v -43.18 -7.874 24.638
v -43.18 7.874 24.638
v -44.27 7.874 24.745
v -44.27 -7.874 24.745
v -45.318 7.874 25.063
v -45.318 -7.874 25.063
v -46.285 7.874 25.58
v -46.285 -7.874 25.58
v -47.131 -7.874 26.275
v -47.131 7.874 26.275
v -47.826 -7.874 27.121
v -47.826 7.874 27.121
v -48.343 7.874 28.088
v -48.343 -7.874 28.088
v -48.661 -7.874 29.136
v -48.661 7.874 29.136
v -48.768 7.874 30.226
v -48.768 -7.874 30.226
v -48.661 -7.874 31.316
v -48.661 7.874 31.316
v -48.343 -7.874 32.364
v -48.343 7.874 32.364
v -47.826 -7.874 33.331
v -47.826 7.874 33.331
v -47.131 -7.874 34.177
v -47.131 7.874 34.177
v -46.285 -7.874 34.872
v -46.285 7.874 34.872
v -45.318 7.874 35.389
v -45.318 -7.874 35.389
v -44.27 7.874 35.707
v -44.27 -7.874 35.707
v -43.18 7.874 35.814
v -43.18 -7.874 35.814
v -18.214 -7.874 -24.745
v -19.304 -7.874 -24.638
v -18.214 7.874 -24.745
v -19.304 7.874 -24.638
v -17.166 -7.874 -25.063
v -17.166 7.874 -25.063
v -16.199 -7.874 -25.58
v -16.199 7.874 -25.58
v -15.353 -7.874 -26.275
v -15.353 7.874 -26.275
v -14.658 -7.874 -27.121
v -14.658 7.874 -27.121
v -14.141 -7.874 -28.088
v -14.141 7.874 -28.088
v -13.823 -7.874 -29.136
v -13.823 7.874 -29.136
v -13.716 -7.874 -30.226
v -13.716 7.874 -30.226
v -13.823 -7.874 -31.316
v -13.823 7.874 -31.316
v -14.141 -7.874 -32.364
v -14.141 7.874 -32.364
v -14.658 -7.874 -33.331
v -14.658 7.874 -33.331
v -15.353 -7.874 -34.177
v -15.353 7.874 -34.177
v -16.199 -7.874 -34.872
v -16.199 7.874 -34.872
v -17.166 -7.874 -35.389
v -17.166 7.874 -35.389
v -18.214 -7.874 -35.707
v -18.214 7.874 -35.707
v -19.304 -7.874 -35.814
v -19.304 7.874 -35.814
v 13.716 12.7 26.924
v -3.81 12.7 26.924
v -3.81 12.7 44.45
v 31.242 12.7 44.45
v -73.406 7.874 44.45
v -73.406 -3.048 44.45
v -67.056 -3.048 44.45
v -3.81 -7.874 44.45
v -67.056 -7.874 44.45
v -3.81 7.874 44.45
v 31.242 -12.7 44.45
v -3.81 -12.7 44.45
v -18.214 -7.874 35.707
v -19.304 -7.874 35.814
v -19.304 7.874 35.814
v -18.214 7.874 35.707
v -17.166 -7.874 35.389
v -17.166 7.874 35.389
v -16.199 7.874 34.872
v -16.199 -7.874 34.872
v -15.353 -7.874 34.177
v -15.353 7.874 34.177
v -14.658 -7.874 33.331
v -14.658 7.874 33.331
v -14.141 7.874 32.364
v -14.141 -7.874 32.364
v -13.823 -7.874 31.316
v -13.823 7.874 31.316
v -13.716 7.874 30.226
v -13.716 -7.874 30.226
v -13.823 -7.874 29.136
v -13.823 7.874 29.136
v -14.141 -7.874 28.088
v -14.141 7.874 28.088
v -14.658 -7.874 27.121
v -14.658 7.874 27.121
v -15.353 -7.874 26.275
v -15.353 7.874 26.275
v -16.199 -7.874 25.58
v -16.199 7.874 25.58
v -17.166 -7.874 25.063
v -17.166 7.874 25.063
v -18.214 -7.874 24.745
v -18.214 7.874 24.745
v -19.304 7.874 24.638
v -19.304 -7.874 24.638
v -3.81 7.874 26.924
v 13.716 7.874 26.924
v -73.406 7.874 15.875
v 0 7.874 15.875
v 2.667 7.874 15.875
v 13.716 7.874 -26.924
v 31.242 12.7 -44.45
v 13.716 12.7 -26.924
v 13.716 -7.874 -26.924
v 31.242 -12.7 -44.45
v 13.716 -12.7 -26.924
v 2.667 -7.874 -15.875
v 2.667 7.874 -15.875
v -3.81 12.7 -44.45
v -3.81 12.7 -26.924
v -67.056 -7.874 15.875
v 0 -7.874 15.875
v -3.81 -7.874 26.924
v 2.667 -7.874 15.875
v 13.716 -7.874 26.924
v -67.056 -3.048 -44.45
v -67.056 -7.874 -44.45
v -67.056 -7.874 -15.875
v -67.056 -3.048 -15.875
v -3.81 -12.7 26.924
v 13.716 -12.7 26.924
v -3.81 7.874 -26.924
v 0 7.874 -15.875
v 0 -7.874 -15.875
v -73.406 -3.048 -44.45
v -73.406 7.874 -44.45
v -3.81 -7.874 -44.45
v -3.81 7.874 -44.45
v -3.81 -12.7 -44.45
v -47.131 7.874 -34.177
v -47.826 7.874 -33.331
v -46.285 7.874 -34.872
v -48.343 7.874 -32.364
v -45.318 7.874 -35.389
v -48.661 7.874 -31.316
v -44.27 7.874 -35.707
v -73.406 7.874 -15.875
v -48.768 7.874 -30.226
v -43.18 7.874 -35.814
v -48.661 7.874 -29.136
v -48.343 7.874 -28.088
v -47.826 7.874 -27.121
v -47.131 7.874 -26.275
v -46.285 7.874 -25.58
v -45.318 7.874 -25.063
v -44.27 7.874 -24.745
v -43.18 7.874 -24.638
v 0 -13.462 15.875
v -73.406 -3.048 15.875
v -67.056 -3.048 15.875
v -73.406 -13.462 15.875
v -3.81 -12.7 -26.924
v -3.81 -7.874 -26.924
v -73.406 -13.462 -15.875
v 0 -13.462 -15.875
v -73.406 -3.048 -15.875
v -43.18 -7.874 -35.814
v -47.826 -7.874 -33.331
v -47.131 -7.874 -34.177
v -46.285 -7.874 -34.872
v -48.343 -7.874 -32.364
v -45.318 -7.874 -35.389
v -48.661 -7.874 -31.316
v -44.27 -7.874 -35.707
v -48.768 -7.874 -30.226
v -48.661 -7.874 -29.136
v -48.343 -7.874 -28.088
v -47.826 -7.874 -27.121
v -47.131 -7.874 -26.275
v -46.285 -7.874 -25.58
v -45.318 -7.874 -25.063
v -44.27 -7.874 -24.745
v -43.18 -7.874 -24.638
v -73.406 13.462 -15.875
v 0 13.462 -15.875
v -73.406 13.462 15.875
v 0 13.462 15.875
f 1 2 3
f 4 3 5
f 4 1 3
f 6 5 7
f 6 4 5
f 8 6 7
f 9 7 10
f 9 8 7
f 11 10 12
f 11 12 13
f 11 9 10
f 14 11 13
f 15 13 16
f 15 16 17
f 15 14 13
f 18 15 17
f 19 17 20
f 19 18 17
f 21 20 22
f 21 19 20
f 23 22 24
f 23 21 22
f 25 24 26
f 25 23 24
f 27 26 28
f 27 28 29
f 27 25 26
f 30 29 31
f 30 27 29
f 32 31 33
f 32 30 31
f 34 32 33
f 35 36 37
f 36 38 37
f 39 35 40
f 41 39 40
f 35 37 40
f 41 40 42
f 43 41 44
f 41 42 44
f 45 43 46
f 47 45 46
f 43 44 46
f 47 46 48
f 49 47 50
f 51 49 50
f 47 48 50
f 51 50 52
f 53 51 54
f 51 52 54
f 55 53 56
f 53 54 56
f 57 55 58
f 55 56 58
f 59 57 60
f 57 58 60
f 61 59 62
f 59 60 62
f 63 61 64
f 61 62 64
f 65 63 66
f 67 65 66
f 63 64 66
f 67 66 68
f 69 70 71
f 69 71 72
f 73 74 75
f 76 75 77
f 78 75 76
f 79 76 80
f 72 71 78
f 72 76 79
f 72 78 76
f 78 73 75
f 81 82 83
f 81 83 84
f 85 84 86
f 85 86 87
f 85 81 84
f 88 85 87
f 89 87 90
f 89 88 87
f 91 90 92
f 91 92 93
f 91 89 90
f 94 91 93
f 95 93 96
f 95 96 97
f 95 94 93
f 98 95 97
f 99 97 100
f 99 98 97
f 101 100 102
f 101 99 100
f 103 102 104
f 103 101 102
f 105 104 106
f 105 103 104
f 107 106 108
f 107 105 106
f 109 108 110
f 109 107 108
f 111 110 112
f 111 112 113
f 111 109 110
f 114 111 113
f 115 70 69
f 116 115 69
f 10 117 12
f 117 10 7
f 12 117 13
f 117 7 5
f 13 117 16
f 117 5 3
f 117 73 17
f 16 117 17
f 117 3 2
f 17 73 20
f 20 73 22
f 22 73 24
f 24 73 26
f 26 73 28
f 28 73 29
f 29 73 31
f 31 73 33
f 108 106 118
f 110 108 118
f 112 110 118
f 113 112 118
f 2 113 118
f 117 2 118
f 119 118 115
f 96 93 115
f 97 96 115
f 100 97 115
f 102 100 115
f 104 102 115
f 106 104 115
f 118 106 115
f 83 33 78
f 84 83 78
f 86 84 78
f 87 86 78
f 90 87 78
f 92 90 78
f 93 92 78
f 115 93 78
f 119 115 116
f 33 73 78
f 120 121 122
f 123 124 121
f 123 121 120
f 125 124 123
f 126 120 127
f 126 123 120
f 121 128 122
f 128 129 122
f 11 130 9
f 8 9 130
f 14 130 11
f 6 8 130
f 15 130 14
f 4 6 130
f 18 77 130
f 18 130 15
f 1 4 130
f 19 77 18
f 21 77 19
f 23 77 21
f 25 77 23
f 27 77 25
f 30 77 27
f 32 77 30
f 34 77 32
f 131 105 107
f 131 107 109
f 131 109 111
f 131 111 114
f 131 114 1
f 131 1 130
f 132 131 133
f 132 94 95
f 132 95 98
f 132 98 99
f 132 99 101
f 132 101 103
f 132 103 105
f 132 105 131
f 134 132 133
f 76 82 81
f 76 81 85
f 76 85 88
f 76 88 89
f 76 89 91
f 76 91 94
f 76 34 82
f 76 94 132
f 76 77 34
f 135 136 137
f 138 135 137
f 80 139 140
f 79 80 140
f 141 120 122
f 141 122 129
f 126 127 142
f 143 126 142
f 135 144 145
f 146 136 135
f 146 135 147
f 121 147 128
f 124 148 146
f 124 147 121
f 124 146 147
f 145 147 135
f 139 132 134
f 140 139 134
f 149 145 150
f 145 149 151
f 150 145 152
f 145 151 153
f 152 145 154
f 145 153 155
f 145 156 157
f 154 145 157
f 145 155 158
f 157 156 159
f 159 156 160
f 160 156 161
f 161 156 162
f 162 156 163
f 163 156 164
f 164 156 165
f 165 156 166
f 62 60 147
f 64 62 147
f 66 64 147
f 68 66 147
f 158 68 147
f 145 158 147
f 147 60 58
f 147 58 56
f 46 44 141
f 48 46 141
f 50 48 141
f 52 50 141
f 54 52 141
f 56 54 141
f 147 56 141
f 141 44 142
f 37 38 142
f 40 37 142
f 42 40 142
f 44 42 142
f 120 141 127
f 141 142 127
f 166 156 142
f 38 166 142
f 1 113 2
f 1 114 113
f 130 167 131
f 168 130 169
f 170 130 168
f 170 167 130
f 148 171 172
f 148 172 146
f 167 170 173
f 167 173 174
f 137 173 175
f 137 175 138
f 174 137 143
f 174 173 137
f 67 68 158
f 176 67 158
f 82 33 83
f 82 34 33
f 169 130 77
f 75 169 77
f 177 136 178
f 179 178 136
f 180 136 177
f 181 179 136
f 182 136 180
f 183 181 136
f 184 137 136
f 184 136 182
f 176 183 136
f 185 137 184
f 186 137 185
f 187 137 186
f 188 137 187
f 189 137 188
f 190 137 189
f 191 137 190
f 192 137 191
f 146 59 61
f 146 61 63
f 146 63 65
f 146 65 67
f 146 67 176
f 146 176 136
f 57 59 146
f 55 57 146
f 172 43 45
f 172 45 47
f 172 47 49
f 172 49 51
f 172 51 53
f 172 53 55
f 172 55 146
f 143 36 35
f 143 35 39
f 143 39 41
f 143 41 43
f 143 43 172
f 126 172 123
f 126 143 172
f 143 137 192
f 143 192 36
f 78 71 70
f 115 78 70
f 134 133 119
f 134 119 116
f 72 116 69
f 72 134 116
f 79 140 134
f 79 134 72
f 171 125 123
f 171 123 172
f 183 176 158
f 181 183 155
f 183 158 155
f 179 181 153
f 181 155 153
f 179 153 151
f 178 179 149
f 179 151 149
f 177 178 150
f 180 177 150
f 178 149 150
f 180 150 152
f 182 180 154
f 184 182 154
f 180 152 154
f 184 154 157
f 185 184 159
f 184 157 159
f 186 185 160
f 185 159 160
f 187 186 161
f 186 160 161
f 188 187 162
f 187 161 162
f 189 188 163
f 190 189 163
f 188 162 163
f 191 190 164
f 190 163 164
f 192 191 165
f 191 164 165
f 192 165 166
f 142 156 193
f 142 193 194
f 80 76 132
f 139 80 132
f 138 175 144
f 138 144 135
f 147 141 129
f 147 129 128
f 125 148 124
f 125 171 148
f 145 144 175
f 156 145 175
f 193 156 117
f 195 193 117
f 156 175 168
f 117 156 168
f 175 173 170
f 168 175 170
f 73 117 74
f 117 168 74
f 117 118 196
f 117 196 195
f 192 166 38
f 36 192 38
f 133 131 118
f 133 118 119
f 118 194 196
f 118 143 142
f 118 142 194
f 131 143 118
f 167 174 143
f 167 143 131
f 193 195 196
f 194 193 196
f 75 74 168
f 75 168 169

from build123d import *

# Parameters (mm, degrees)
F1_DEPTH = 13.462
F2_DEPTH = 7.874
F3_DEPTH = 12.7
F0_W     = 6.35
F0_H     = 28.575
F4_DEPTH = 7.874
F5_W     = 6.35
F5_H     = 28.575
F6_DEPTH = 4.826


with BuildPart() as f1:
    # F0 (on Front) → F1 (new body, symmetric)
    with BuildSketch(Plane.XZ):
        Polygon((-67.056, -15.875), (0, -15.875), (0, 15.875), (-67.056, 15.875), (-73.406, 15.875), (-73.406, -15.875), align=None)
    extrude(amount=F1_DEPTH, both=True)

    # F0 (on Front) → F2 (join, symmetric)
    with BuildSketch(Plane.XZ):
        Polygon((-3.81, -26.924), (13.716, -26.924), (2.667, -15.875), (0, -15.875), (-67.056, -15.875), (-67.056, -44.45), (-3.81, -44.45), align=None)
        with BuildLine():
            ThreePointArc((-19.304, -24.638), (-13.716, -30.226), (-19.304, -35.814))
            Line((-19.304, -35.814), (-43.18, -35.814))
            ThreePointArc((-43.18, -35.814), (-48.768, -30.226), (-43.18, -24.638))
            Line((-43.18, -24.638), (-19.304, -24.638))
        make_face(mode=Mode.SUBTRACT)
        Polygon((-67.056, 15.875), (0, 15.875), (2.667, 15.875), (13.716, 26.924), (-3.81, 26.924), (-3.81, 44.45), (-67.056, 44.45), align=None)
        with BuildLine():
            ThreePointArc((-19.304, 35.814), (-13.716, 30.226), (-19.304, 24.638))
            Line((-19.304, 24.638), (-43.18, 24.638))
            ThreePointArc((-43.18, 24.638), (-48.768, 30.226), (-43.18, 35.814))
            Line((-43.18, 35.814), (-19.304, 35.814))
        make_face(mode=Mode.SUBTRACT)
    extrude(amount=F2_DEPTH, both=True)

    # F0 (on Front) → F3 (join, symmetric)
    with BuildSketch(Plane.XZ):
        Polygon((-3.81, 26.924), (13.716, 26.924), (31.242, 44.45), (-3.81, 44.45), align=None)
        Polygon((-3.81, -44.45), (31.242, -44.45), (13.716, -26.924), (-3.81, -26.924), align=None)
    extrude(amount=F3_DEPTH, both=True)

    # F0 (on Front) → F4 (join, symmetric)
    with BuildSketch(Plane.XZ):
        with Locations((-70.231, 30.1625)):
            Rectangle(F0_W, F0_H)
        with Locations((-70.231, -30.1625)):
            Rectangle(F0_W, F0_H)
    extrude(amount=F4_DEPTH, both=True)

    # F5 (on face) → F6 (cut)
    with BuildSketch(Plane.XZ.offset(7.874)):
        with Locations((-70.231, 30.1625)):
            Rectangle(F5_W, F5_H)
        with Locations((-70.231, -30.1625)):
            Rectangle(F5_W, F5_H)
    extrude(amount=-F6_DEPTH, mode=Mode.SUBTRACT)


solid = f1.part
